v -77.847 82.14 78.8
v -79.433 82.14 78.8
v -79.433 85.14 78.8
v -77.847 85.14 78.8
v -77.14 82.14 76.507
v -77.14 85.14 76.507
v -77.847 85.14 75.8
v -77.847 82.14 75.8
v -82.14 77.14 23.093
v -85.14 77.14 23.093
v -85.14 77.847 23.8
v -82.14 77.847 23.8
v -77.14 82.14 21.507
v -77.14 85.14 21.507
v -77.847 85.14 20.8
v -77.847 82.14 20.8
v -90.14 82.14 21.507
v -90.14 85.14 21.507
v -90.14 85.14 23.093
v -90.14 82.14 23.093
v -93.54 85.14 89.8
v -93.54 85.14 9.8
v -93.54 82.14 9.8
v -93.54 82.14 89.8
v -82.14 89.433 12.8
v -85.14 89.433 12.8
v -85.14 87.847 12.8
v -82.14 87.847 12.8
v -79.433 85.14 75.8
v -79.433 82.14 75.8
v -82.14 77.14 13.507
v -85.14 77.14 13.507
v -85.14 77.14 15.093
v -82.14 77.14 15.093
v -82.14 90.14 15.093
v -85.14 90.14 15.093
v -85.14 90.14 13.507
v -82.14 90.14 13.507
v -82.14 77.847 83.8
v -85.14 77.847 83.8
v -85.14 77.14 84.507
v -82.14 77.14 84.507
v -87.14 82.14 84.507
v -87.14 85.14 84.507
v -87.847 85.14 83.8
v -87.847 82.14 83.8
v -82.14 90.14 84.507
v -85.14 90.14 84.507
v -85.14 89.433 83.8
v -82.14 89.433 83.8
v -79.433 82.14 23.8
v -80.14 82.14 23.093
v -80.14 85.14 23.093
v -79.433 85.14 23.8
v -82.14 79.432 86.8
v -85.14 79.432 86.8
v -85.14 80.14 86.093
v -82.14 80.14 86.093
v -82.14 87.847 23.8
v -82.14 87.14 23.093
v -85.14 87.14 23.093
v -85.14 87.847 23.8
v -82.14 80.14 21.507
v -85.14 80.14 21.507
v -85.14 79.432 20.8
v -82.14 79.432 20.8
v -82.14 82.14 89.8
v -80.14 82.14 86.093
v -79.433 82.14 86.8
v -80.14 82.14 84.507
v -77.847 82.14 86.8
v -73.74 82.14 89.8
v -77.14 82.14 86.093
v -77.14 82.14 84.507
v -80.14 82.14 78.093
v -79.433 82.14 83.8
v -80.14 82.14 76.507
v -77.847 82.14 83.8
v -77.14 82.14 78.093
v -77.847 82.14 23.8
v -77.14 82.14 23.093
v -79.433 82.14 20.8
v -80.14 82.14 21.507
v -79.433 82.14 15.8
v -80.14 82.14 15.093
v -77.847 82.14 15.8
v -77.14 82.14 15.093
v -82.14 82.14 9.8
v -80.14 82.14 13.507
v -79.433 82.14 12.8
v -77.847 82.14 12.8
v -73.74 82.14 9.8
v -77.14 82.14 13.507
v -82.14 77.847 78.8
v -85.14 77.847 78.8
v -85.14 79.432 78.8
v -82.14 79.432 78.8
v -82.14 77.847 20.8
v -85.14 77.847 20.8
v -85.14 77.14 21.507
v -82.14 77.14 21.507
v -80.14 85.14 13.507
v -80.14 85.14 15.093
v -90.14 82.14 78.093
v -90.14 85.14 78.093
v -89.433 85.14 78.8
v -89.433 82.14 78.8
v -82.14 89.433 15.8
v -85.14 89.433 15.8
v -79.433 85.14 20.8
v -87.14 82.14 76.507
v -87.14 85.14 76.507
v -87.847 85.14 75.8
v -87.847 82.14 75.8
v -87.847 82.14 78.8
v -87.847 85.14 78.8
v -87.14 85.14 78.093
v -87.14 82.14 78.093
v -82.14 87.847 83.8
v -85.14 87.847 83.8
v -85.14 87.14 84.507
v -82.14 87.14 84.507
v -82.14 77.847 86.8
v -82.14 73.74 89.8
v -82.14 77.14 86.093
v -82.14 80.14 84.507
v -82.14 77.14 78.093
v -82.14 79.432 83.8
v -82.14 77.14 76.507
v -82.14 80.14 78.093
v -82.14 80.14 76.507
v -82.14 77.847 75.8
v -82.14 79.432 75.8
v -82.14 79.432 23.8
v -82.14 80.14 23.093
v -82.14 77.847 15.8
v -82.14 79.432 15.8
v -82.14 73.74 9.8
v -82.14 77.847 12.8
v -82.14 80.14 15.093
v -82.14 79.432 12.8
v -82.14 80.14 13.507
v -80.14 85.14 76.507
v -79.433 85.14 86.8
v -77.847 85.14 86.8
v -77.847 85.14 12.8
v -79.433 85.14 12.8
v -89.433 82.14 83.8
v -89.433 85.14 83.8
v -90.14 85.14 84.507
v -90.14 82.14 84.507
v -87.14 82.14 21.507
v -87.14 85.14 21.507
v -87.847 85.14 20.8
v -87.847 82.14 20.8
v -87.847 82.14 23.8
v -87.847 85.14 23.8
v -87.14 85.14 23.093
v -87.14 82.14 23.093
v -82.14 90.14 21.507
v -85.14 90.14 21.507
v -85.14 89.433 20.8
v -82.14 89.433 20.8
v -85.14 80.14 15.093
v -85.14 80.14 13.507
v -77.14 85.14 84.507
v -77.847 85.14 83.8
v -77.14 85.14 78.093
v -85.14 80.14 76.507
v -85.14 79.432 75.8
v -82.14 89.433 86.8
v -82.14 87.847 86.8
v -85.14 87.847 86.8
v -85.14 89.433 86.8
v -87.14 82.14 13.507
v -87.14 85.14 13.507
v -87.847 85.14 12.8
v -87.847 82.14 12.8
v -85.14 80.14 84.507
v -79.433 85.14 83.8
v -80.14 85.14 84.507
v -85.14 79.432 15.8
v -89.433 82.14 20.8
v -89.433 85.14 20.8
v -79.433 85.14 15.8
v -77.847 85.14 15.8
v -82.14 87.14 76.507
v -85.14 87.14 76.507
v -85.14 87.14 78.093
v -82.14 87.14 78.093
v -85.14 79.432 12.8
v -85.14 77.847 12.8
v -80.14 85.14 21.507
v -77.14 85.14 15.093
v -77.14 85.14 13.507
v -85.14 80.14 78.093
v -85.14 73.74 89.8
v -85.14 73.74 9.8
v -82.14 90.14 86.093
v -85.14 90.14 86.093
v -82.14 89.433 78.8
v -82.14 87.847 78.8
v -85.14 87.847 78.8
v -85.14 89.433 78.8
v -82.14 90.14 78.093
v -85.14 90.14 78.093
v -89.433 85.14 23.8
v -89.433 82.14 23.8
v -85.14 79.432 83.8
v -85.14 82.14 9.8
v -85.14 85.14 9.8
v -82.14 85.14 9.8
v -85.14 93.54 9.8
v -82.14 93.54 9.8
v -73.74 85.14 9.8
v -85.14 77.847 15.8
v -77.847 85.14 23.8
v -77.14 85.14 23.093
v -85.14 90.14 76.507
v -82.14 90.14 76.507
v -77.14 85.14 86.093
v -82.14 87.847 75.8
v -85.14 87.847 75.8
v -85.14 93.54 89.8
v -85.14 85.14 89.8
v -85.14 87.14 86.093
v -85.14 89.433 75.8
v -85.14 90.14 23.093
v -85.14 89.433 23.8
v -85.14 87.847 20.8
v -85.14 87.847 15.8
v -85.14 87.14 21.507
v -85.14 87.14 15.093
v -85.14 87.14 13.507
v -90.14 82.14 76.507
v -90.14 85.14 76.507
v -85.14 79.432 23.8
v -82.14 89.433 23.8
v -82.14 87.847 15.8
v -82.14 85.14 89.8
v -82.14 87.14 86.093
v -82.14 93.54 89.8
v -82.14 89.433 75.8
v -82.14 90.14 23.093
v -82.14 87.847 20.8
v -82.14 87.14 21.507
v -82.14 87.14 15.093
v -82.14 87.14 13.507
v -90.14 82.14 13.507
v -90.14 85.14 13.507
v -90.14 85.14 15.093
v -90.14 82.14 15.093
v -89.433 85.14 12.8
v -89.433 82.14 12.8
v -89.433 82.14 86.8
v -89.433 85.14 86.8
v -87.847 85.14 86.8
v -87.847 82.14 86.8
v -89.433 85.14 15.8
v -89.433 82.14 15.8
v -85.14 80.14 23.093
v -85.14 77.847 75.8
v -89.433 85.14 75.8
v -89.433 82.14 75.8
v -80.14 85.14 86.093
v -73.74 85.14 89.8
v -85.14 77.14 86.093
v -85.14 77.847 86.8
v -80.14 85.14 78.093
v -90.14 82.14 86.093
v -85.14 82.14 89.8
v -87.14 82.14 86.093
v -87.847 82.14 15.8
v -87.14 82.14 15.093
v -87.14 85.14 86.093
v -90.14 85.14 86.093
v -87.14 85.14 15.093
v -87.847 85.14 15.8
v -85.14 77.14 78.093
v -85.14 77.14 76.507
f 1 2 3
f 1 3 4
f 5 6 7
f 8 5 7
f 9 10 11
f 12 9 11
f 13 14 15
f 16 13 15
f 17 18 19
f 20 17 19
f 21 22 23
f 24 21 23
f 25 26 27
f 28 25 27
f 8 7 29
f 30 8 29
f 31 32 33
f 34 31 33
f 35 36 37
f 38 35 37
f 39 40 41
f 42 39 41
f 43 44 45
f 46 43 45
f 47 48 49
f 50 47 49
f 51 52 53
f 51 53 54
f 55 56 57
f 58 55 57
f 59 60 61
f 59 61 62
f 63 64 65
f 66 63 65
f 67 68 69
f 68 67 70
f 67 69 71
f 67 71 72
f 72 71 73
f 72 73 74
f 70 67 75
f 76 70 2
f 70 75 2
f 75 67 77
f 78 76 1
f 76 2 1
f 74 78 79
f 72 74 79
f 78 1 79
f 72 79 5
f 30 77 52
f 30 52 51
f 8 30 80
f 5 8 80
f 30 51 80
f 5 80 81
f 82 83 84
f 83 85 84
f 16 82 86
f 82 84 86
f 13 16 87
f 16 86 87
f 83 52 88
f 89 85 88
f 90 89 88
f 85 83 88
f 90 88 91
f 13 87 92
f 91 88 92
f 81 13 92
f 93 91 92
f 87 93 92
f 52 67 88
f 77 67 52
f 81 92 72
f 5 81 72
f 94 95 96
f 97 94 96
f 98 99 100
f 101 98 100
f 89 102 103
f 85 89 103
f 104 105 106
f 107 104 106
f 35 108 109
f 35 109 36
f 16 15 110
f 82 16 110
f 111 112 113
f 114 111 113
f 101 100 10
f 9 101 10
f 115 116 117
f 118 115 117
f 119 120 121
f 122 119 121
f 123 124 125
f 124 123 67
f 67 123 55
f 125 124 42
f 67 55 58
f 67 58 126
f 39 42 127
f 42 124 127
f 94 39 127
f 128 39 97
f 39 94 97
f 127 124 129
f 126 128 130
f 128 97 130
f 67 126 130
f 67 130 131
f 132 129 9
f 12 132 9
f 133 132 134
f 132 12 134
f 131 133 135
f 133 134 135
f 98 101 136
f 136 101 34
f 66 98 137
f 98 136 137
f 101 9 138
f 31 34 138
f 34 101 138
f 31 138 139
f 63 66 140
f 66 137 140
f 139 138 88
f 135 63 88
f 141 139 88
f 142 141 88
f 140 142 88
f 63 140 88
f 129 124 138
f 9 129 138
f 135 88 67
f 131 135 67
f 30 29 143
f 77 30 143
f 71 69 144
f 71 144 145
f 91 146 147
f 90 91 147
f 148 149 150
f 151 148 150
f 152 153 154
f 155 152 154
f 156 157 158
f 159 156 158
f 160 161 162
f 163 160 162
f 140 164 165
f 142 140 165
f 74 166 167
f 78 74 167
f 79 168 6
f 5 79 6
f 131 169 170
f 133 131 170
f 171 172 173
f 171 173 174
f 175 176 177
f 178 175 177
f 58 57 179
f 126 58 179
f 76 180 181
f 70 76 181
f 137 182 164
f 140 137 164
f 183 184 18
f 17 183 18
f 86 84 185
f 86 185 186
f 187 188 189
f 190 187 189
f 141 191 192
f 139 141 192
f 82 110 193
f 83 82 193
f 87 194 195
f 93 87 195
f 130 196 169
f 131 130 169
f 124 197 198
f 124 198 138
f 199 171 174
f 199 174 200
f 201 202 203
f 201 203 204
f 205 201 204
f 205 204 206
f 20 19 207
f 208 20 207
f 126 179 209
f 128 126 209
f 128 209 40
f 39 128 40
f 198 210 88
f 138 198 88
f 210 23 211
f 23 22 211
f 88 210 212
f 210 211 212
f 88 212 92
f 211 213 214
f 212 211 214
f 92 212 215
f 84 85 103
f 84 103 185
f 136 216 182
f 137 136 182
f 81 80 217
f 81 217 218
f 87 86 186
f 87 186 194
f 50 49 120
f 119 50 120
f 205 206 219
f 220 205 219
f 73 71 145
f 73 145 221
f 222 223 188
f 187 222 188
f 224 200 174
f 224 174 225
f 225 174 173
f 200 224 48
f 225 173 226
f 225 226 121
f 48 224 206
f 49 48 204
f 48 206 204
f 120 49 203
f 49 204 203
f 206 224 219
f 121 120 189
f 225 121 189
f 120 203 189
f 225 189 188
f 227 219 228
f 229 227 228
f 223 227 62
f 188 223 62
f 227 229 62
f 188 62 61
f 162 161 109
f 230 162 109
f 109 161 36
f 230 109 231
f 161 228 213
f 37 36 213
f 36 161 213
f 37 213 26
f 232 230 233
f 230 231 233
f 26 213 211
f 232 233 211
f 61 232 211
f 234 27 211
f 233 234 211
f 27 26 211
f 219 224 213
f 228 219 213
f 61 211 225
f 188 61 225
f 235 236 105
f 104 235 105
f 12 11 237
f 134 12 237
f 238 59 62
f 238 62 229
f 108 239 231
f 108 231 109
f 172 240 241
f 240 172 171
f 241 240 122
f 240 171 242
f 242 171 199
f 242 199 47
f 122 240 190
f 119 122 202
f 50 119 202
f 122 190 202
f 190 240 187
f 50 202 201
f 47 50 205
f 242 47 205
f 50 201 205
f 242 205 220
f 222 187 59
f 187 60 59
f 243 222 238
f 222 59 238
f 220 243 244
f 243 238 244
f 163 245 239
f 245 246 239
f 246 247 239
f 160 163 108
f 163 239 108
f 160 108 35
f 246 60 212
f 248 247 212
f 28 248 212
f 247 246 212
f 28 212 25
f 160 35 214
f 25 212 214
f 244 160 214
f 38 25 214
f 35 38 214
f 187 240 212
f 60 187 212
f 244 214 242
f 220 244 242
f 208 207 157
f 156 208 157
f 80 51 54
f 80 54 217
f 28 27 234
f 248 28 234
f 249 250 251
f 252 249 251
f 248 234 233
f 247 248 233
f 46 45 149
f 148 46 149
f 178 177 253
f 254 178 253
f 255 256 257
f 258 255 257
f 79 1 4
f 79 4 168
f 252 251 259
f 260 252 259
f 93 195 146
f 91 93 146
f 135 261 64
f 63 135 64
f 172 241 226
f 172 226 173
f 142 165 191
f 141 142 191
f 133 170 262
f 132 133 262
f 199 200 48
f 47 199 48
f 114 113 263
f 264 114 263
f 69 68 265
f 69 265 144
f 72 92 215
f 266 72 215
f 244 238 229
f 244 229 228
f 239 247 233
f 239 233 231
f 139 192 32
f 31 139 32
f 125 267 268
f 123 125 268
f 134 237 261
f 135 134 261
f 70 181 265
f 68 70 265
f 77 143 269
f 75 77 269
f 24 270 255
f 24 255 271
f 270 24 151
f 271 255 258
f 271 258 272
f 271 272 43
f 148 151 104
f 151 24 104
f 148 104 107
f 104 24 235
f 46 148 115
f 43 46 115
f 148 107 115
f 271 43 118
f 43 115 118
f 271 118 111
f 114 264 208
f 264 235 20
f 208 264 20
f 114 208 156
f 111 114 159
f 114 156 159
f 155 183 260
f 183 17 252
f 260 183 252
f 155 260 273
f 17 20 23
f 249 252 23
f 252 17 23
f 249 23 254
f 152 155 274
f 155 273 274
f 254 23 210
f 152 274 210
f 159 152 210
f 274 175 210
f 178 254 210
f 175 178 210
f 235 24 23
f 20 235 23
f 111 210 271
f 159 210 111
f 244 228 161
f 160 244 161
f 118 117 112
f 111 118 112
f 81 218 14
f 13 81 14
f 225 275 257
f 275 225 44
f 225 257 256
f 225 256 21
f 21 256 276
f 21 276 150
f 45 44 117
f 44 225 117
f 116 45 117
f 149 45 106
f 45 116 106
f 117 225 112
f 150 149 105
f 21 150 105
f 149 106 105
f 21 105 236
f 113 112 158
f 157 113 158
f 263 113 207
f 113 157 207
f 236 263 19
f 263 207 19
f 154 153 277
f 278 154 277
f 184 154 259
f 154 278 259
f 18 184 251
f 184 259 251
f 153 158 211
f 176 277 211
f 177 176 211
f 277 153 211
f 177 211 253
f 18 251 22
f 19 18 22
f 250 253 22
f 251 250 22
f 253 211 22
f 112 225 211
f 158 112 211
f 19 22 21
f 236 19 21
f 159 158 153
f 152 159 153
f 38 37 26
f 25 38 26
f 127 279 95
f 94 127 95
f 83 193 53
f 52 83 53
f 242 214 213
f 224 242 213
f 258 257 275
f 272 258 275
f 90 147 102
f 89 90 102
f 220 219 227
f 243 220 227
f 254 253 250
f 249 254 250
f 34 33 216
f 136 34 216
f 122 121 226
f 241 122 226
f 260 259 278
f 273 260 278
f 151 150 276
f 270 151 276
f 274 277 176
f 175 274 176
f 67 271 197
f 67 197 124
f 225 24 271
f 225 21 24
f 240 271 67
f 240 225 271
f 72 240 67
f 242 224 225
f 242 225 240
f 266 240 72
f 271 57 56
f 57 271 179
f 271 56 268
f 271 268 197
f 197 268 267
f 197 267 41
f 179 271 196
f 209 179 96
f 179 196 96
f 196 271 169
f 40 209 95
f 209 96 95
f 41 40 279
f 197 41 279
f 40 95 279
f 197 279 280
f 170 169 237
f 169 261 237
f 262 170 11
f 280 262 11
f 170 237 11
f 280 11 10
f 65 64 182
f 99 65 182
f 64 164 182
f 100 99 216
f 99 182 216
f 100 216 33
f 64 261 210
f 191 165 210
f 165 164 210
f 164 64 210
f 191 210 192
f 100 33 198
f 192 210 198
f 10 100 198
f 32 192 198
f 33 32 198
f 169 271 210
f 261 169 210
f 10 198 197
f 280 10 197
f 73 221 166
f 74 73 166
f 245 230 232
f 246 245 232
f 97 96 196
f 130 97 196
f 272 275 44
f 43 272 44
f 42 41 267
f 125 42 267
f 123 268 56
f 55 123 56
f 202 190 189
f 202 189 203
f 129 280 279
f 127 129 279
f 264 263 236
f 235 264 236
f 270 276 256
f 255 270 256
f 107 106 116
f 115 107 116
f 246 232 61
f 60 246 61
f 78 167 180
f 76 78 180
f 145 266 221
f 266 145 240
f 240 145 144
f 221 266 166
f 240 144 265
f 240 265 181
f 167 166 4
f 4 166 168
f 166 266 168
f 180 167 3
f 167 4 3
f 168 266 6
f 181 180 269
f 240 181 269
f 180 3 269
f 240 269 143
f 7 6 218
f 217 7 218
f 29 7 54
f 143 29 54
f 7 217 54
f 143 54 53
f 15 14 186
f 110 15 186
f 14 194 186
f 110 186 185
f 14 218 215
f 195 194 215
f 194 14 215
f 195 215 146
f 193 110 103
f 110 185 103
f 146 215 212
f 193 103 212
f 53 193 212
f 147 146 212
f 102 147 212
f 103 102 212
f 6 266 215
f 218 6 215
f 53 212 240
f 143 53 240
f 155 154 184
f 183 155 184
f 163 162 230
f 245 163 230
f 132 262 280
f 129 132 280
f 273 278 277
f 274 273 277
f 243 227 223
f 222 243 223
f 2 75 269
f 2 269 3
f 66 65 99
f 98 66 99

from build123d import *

# Parameters (mm, degrees)
PAD038_DEPTH    = 80
POCKET025_DEPTH = 11.4010000384
POCKET026_DEPTH = 11.4010366708


with BuildPart() as part:
    # Sketch063 (on Face65 of Binder012) → Pad038 (new body)
    with BuildSketch(Plane.XY.offset(9.8)):
        Polygon((-93.5396103068, 82.1395919522), (-85.1396103452, 82.1395919522), (-85.1396103452, 73.7395919906), (-82.1396102684, 73.7395919906), (-82.1396102684, 82.1395919522), (-73.7396103068, 82.1396286614), (-73.7396103068, 85.1396286614), (-82.1396102684, 85.1396286614), (-82.1396103452, 93.539628623), (-85.1396103452, 93.539628623), (-85.1396103452, 85.1396286614), (-93.5396103068, 85.1396286614), align=None)
    extrude(amount=PAD038_DEPTH)

    # Sketch064 (on Face2 of Pad038) → Pocket025 (cut, through all)
    with BuildSketch(Plane(origin=(-85.1396103452, 0, 0), x_dir=(0, -1, 0), z_dir=(-1, 0, 0))):
        Polygon((-87.1396286614, 13.5071067812), (-87.1396286614, 15.0928932188), (-87.8467354426, 15.8), (-89.4325218802, 15.8), (-90.1396286614, 15.0928932188), (-90.1396286614, 13.5071067812), (-89.4325218802, 12.8), (-87.8467354426, 12.8), align=None)
        Polygon((-79.432485171, 12.8), (-77.8466987333, 12.8), (-77.1395919522, 13.5071067812), (-77.1395919522, 15.0928932188), (-77.8466987333, 15.8), (-79.432485171, 15.8), (-80.1395919522, 15.0928932188), (-80.1395919522, 13.5071067812), align=None)
        Polygon((-89.4325218802, 20.8), (-87.8467354426, 20.8), (-87.1396286614, 21.5071067812), (-87.1396286614, 23.0928932188), (-87.8467354426, 23.8), (-89.4325218802, 23.8), (-90.1396286614, 23.0928932188), (-90.1396286614, 21.5071067812), align=None)
        Polygon((-79.432485171, 20.8), (-77.8466987333, 20.8), (-77.1395919522, 21.5071067812), (-77.1395919522, 23.0928932188), (-77.8466987333, 23.8), (-79.432485171, 23.8), (-80.1395919522, 23.0928932188), (-80.1395919522, 21.5071067812), align=None)
        Polygon((-90.1396286614, 86.0928932188), (-90.1396286614, 84.5071067812), (-89.4325218802, 83.8), (-87.8467354426, 83.8), (-87.1396286614, 84.5071067812), (-87.1396286614, 86.0928932188), (-87.8467354426, 86.8), (-89.4325218802, 86.8), align=None)
        Polygon((-80.1395919522, 86.0928932188), (-80.1395919522, 84.5071067812), (-79.432485171, 83.8), (-77.8466987333, 83.8), (-77.1395919522, 84.5071067812), (-77.1395919522, 86.0928932188), (-77.8466987333, 86.8), (-79.432485171, 86.8), align=None)
        Polygon((-90.1396286614, 78.0928932188), (-90.1396286614, 76.5071067812), (-89.4325218802, 75.8), (-87.8467354426, 75.8), (-87.1396286614, 76.5071067812), (-87.1396286614, 78.0928932188), (-87.8467354426, 78.8), (-89.4325218802, 78.8), align=None)
        Polygon((-80.1395919522, 78.0928932188), (-80.1395919522, 76.5071067812), (-79.432485171, 75.8), (-77.8466987333, 75.8), (-77.1395919522, 76.5071067812), (-77.1395919522, 78.0928932188), (-77.8466987333, 78.8), (-79.432485171, 78.8), align=None)
    extrude(amount=-POCKET025_DEPTH, mode=Mode.SUBTRACT)

    # Sketch065 (on Face6 of Pocket025) → Pocket026 (cut, through all)
    with BuildSketch(Plane(origin=(0, 85.1396286614, 0), x_dir=(-1, 0, 0), z_dir=(0, 1, 0))):
        Polygon((87.1396103452, 15.0928932188), (87.1396103452, 13.5071067812), (87.8467171264, 12.8), (89.432503564, 12.8), (90.1396103452, 13.5071067812), (90.1396103452, 15.0928932188), (89.432503564, 15.8), (87.8467171264, 15.8), align=None)
        Polygon((87.1396103452, 23.0928932188), (87.1396103452, 21.5071067812), (87.8467171264, 20.8), (89.432503564, 20.8), (90.1396103452, 21.5071067812), (90.1396103452, 23.0928932188), (89.432503564, 23.8), (87.8467171264, 23.8), align=None)
        Polygon((79.4325034872, 15.8), (77.8467170496, 15.8), (77.1396102684, 15.0928932188), (77.1396102684, 13.5071067812), (77.8467170496, 12.8), (79.4325034872, 12.8), (80.1396102684, 13.5071067812), (80.1396102684, 15.0928932188), align=None)
        Polygon((79.4325034872, 23.8), (77.8467170496, 23.8), (77.1396102684, 23.0928932188), (77.1396102684, 21.5071067812), (77.8467170496, 20.8), (79.4325034872, 20.8), (80.1396102684, 21.5071067812), (80.1396102684, 23.0928932188), align=None)
        Polygon((77.1396102684, 86.0928932188), (77.1396102684, 84.5071067812), (77.8467170496, 83.8), (79.4325034872, 83.8), (80.1396102684, 84.5071067812), (80.1396102684, 86.0928932188), (79.4325034872, 86.8), (77.8467170496, 86.8), align=None)
        Polygon((87.1396103452, 86.0928932188), (87.1396103452, 84.5071067812), (87.8467171264, 83.8), (89.432503564, 83.8), (90.1396103452, 84.5071067812), (90.1396103452, 86.0928932188), (89.432503564, 86.8), (87.8467171264, 86.8), align=None)
        Polygon((77.1396102684, 78.0928932188), (77.1396102684, 76.5071067812), (77.8467170496, 75.8), (79.4325034872, 75.8), (80.1396102684, 76.5071067812), (80.1396102684, 78.0928932188), (79.4325034872, 78.8), (77.8467170496, 78.8), align=None)
        Polygon((87.1396103452, 78.0928932188), (87.1396103452, 76.5071067812), (87.8467171264, 75.8), (89.432503564, 75.8), (90.1396103452, 76.5071067812), (90.1396103452, 78.0928932188), (89.432503564, 78.8), (87.8467171264, 78.8), align=None)
    extrude(amount=-POCKET026_DEPTH, mode=Mode.SUBTRACT)


solid = part.part
